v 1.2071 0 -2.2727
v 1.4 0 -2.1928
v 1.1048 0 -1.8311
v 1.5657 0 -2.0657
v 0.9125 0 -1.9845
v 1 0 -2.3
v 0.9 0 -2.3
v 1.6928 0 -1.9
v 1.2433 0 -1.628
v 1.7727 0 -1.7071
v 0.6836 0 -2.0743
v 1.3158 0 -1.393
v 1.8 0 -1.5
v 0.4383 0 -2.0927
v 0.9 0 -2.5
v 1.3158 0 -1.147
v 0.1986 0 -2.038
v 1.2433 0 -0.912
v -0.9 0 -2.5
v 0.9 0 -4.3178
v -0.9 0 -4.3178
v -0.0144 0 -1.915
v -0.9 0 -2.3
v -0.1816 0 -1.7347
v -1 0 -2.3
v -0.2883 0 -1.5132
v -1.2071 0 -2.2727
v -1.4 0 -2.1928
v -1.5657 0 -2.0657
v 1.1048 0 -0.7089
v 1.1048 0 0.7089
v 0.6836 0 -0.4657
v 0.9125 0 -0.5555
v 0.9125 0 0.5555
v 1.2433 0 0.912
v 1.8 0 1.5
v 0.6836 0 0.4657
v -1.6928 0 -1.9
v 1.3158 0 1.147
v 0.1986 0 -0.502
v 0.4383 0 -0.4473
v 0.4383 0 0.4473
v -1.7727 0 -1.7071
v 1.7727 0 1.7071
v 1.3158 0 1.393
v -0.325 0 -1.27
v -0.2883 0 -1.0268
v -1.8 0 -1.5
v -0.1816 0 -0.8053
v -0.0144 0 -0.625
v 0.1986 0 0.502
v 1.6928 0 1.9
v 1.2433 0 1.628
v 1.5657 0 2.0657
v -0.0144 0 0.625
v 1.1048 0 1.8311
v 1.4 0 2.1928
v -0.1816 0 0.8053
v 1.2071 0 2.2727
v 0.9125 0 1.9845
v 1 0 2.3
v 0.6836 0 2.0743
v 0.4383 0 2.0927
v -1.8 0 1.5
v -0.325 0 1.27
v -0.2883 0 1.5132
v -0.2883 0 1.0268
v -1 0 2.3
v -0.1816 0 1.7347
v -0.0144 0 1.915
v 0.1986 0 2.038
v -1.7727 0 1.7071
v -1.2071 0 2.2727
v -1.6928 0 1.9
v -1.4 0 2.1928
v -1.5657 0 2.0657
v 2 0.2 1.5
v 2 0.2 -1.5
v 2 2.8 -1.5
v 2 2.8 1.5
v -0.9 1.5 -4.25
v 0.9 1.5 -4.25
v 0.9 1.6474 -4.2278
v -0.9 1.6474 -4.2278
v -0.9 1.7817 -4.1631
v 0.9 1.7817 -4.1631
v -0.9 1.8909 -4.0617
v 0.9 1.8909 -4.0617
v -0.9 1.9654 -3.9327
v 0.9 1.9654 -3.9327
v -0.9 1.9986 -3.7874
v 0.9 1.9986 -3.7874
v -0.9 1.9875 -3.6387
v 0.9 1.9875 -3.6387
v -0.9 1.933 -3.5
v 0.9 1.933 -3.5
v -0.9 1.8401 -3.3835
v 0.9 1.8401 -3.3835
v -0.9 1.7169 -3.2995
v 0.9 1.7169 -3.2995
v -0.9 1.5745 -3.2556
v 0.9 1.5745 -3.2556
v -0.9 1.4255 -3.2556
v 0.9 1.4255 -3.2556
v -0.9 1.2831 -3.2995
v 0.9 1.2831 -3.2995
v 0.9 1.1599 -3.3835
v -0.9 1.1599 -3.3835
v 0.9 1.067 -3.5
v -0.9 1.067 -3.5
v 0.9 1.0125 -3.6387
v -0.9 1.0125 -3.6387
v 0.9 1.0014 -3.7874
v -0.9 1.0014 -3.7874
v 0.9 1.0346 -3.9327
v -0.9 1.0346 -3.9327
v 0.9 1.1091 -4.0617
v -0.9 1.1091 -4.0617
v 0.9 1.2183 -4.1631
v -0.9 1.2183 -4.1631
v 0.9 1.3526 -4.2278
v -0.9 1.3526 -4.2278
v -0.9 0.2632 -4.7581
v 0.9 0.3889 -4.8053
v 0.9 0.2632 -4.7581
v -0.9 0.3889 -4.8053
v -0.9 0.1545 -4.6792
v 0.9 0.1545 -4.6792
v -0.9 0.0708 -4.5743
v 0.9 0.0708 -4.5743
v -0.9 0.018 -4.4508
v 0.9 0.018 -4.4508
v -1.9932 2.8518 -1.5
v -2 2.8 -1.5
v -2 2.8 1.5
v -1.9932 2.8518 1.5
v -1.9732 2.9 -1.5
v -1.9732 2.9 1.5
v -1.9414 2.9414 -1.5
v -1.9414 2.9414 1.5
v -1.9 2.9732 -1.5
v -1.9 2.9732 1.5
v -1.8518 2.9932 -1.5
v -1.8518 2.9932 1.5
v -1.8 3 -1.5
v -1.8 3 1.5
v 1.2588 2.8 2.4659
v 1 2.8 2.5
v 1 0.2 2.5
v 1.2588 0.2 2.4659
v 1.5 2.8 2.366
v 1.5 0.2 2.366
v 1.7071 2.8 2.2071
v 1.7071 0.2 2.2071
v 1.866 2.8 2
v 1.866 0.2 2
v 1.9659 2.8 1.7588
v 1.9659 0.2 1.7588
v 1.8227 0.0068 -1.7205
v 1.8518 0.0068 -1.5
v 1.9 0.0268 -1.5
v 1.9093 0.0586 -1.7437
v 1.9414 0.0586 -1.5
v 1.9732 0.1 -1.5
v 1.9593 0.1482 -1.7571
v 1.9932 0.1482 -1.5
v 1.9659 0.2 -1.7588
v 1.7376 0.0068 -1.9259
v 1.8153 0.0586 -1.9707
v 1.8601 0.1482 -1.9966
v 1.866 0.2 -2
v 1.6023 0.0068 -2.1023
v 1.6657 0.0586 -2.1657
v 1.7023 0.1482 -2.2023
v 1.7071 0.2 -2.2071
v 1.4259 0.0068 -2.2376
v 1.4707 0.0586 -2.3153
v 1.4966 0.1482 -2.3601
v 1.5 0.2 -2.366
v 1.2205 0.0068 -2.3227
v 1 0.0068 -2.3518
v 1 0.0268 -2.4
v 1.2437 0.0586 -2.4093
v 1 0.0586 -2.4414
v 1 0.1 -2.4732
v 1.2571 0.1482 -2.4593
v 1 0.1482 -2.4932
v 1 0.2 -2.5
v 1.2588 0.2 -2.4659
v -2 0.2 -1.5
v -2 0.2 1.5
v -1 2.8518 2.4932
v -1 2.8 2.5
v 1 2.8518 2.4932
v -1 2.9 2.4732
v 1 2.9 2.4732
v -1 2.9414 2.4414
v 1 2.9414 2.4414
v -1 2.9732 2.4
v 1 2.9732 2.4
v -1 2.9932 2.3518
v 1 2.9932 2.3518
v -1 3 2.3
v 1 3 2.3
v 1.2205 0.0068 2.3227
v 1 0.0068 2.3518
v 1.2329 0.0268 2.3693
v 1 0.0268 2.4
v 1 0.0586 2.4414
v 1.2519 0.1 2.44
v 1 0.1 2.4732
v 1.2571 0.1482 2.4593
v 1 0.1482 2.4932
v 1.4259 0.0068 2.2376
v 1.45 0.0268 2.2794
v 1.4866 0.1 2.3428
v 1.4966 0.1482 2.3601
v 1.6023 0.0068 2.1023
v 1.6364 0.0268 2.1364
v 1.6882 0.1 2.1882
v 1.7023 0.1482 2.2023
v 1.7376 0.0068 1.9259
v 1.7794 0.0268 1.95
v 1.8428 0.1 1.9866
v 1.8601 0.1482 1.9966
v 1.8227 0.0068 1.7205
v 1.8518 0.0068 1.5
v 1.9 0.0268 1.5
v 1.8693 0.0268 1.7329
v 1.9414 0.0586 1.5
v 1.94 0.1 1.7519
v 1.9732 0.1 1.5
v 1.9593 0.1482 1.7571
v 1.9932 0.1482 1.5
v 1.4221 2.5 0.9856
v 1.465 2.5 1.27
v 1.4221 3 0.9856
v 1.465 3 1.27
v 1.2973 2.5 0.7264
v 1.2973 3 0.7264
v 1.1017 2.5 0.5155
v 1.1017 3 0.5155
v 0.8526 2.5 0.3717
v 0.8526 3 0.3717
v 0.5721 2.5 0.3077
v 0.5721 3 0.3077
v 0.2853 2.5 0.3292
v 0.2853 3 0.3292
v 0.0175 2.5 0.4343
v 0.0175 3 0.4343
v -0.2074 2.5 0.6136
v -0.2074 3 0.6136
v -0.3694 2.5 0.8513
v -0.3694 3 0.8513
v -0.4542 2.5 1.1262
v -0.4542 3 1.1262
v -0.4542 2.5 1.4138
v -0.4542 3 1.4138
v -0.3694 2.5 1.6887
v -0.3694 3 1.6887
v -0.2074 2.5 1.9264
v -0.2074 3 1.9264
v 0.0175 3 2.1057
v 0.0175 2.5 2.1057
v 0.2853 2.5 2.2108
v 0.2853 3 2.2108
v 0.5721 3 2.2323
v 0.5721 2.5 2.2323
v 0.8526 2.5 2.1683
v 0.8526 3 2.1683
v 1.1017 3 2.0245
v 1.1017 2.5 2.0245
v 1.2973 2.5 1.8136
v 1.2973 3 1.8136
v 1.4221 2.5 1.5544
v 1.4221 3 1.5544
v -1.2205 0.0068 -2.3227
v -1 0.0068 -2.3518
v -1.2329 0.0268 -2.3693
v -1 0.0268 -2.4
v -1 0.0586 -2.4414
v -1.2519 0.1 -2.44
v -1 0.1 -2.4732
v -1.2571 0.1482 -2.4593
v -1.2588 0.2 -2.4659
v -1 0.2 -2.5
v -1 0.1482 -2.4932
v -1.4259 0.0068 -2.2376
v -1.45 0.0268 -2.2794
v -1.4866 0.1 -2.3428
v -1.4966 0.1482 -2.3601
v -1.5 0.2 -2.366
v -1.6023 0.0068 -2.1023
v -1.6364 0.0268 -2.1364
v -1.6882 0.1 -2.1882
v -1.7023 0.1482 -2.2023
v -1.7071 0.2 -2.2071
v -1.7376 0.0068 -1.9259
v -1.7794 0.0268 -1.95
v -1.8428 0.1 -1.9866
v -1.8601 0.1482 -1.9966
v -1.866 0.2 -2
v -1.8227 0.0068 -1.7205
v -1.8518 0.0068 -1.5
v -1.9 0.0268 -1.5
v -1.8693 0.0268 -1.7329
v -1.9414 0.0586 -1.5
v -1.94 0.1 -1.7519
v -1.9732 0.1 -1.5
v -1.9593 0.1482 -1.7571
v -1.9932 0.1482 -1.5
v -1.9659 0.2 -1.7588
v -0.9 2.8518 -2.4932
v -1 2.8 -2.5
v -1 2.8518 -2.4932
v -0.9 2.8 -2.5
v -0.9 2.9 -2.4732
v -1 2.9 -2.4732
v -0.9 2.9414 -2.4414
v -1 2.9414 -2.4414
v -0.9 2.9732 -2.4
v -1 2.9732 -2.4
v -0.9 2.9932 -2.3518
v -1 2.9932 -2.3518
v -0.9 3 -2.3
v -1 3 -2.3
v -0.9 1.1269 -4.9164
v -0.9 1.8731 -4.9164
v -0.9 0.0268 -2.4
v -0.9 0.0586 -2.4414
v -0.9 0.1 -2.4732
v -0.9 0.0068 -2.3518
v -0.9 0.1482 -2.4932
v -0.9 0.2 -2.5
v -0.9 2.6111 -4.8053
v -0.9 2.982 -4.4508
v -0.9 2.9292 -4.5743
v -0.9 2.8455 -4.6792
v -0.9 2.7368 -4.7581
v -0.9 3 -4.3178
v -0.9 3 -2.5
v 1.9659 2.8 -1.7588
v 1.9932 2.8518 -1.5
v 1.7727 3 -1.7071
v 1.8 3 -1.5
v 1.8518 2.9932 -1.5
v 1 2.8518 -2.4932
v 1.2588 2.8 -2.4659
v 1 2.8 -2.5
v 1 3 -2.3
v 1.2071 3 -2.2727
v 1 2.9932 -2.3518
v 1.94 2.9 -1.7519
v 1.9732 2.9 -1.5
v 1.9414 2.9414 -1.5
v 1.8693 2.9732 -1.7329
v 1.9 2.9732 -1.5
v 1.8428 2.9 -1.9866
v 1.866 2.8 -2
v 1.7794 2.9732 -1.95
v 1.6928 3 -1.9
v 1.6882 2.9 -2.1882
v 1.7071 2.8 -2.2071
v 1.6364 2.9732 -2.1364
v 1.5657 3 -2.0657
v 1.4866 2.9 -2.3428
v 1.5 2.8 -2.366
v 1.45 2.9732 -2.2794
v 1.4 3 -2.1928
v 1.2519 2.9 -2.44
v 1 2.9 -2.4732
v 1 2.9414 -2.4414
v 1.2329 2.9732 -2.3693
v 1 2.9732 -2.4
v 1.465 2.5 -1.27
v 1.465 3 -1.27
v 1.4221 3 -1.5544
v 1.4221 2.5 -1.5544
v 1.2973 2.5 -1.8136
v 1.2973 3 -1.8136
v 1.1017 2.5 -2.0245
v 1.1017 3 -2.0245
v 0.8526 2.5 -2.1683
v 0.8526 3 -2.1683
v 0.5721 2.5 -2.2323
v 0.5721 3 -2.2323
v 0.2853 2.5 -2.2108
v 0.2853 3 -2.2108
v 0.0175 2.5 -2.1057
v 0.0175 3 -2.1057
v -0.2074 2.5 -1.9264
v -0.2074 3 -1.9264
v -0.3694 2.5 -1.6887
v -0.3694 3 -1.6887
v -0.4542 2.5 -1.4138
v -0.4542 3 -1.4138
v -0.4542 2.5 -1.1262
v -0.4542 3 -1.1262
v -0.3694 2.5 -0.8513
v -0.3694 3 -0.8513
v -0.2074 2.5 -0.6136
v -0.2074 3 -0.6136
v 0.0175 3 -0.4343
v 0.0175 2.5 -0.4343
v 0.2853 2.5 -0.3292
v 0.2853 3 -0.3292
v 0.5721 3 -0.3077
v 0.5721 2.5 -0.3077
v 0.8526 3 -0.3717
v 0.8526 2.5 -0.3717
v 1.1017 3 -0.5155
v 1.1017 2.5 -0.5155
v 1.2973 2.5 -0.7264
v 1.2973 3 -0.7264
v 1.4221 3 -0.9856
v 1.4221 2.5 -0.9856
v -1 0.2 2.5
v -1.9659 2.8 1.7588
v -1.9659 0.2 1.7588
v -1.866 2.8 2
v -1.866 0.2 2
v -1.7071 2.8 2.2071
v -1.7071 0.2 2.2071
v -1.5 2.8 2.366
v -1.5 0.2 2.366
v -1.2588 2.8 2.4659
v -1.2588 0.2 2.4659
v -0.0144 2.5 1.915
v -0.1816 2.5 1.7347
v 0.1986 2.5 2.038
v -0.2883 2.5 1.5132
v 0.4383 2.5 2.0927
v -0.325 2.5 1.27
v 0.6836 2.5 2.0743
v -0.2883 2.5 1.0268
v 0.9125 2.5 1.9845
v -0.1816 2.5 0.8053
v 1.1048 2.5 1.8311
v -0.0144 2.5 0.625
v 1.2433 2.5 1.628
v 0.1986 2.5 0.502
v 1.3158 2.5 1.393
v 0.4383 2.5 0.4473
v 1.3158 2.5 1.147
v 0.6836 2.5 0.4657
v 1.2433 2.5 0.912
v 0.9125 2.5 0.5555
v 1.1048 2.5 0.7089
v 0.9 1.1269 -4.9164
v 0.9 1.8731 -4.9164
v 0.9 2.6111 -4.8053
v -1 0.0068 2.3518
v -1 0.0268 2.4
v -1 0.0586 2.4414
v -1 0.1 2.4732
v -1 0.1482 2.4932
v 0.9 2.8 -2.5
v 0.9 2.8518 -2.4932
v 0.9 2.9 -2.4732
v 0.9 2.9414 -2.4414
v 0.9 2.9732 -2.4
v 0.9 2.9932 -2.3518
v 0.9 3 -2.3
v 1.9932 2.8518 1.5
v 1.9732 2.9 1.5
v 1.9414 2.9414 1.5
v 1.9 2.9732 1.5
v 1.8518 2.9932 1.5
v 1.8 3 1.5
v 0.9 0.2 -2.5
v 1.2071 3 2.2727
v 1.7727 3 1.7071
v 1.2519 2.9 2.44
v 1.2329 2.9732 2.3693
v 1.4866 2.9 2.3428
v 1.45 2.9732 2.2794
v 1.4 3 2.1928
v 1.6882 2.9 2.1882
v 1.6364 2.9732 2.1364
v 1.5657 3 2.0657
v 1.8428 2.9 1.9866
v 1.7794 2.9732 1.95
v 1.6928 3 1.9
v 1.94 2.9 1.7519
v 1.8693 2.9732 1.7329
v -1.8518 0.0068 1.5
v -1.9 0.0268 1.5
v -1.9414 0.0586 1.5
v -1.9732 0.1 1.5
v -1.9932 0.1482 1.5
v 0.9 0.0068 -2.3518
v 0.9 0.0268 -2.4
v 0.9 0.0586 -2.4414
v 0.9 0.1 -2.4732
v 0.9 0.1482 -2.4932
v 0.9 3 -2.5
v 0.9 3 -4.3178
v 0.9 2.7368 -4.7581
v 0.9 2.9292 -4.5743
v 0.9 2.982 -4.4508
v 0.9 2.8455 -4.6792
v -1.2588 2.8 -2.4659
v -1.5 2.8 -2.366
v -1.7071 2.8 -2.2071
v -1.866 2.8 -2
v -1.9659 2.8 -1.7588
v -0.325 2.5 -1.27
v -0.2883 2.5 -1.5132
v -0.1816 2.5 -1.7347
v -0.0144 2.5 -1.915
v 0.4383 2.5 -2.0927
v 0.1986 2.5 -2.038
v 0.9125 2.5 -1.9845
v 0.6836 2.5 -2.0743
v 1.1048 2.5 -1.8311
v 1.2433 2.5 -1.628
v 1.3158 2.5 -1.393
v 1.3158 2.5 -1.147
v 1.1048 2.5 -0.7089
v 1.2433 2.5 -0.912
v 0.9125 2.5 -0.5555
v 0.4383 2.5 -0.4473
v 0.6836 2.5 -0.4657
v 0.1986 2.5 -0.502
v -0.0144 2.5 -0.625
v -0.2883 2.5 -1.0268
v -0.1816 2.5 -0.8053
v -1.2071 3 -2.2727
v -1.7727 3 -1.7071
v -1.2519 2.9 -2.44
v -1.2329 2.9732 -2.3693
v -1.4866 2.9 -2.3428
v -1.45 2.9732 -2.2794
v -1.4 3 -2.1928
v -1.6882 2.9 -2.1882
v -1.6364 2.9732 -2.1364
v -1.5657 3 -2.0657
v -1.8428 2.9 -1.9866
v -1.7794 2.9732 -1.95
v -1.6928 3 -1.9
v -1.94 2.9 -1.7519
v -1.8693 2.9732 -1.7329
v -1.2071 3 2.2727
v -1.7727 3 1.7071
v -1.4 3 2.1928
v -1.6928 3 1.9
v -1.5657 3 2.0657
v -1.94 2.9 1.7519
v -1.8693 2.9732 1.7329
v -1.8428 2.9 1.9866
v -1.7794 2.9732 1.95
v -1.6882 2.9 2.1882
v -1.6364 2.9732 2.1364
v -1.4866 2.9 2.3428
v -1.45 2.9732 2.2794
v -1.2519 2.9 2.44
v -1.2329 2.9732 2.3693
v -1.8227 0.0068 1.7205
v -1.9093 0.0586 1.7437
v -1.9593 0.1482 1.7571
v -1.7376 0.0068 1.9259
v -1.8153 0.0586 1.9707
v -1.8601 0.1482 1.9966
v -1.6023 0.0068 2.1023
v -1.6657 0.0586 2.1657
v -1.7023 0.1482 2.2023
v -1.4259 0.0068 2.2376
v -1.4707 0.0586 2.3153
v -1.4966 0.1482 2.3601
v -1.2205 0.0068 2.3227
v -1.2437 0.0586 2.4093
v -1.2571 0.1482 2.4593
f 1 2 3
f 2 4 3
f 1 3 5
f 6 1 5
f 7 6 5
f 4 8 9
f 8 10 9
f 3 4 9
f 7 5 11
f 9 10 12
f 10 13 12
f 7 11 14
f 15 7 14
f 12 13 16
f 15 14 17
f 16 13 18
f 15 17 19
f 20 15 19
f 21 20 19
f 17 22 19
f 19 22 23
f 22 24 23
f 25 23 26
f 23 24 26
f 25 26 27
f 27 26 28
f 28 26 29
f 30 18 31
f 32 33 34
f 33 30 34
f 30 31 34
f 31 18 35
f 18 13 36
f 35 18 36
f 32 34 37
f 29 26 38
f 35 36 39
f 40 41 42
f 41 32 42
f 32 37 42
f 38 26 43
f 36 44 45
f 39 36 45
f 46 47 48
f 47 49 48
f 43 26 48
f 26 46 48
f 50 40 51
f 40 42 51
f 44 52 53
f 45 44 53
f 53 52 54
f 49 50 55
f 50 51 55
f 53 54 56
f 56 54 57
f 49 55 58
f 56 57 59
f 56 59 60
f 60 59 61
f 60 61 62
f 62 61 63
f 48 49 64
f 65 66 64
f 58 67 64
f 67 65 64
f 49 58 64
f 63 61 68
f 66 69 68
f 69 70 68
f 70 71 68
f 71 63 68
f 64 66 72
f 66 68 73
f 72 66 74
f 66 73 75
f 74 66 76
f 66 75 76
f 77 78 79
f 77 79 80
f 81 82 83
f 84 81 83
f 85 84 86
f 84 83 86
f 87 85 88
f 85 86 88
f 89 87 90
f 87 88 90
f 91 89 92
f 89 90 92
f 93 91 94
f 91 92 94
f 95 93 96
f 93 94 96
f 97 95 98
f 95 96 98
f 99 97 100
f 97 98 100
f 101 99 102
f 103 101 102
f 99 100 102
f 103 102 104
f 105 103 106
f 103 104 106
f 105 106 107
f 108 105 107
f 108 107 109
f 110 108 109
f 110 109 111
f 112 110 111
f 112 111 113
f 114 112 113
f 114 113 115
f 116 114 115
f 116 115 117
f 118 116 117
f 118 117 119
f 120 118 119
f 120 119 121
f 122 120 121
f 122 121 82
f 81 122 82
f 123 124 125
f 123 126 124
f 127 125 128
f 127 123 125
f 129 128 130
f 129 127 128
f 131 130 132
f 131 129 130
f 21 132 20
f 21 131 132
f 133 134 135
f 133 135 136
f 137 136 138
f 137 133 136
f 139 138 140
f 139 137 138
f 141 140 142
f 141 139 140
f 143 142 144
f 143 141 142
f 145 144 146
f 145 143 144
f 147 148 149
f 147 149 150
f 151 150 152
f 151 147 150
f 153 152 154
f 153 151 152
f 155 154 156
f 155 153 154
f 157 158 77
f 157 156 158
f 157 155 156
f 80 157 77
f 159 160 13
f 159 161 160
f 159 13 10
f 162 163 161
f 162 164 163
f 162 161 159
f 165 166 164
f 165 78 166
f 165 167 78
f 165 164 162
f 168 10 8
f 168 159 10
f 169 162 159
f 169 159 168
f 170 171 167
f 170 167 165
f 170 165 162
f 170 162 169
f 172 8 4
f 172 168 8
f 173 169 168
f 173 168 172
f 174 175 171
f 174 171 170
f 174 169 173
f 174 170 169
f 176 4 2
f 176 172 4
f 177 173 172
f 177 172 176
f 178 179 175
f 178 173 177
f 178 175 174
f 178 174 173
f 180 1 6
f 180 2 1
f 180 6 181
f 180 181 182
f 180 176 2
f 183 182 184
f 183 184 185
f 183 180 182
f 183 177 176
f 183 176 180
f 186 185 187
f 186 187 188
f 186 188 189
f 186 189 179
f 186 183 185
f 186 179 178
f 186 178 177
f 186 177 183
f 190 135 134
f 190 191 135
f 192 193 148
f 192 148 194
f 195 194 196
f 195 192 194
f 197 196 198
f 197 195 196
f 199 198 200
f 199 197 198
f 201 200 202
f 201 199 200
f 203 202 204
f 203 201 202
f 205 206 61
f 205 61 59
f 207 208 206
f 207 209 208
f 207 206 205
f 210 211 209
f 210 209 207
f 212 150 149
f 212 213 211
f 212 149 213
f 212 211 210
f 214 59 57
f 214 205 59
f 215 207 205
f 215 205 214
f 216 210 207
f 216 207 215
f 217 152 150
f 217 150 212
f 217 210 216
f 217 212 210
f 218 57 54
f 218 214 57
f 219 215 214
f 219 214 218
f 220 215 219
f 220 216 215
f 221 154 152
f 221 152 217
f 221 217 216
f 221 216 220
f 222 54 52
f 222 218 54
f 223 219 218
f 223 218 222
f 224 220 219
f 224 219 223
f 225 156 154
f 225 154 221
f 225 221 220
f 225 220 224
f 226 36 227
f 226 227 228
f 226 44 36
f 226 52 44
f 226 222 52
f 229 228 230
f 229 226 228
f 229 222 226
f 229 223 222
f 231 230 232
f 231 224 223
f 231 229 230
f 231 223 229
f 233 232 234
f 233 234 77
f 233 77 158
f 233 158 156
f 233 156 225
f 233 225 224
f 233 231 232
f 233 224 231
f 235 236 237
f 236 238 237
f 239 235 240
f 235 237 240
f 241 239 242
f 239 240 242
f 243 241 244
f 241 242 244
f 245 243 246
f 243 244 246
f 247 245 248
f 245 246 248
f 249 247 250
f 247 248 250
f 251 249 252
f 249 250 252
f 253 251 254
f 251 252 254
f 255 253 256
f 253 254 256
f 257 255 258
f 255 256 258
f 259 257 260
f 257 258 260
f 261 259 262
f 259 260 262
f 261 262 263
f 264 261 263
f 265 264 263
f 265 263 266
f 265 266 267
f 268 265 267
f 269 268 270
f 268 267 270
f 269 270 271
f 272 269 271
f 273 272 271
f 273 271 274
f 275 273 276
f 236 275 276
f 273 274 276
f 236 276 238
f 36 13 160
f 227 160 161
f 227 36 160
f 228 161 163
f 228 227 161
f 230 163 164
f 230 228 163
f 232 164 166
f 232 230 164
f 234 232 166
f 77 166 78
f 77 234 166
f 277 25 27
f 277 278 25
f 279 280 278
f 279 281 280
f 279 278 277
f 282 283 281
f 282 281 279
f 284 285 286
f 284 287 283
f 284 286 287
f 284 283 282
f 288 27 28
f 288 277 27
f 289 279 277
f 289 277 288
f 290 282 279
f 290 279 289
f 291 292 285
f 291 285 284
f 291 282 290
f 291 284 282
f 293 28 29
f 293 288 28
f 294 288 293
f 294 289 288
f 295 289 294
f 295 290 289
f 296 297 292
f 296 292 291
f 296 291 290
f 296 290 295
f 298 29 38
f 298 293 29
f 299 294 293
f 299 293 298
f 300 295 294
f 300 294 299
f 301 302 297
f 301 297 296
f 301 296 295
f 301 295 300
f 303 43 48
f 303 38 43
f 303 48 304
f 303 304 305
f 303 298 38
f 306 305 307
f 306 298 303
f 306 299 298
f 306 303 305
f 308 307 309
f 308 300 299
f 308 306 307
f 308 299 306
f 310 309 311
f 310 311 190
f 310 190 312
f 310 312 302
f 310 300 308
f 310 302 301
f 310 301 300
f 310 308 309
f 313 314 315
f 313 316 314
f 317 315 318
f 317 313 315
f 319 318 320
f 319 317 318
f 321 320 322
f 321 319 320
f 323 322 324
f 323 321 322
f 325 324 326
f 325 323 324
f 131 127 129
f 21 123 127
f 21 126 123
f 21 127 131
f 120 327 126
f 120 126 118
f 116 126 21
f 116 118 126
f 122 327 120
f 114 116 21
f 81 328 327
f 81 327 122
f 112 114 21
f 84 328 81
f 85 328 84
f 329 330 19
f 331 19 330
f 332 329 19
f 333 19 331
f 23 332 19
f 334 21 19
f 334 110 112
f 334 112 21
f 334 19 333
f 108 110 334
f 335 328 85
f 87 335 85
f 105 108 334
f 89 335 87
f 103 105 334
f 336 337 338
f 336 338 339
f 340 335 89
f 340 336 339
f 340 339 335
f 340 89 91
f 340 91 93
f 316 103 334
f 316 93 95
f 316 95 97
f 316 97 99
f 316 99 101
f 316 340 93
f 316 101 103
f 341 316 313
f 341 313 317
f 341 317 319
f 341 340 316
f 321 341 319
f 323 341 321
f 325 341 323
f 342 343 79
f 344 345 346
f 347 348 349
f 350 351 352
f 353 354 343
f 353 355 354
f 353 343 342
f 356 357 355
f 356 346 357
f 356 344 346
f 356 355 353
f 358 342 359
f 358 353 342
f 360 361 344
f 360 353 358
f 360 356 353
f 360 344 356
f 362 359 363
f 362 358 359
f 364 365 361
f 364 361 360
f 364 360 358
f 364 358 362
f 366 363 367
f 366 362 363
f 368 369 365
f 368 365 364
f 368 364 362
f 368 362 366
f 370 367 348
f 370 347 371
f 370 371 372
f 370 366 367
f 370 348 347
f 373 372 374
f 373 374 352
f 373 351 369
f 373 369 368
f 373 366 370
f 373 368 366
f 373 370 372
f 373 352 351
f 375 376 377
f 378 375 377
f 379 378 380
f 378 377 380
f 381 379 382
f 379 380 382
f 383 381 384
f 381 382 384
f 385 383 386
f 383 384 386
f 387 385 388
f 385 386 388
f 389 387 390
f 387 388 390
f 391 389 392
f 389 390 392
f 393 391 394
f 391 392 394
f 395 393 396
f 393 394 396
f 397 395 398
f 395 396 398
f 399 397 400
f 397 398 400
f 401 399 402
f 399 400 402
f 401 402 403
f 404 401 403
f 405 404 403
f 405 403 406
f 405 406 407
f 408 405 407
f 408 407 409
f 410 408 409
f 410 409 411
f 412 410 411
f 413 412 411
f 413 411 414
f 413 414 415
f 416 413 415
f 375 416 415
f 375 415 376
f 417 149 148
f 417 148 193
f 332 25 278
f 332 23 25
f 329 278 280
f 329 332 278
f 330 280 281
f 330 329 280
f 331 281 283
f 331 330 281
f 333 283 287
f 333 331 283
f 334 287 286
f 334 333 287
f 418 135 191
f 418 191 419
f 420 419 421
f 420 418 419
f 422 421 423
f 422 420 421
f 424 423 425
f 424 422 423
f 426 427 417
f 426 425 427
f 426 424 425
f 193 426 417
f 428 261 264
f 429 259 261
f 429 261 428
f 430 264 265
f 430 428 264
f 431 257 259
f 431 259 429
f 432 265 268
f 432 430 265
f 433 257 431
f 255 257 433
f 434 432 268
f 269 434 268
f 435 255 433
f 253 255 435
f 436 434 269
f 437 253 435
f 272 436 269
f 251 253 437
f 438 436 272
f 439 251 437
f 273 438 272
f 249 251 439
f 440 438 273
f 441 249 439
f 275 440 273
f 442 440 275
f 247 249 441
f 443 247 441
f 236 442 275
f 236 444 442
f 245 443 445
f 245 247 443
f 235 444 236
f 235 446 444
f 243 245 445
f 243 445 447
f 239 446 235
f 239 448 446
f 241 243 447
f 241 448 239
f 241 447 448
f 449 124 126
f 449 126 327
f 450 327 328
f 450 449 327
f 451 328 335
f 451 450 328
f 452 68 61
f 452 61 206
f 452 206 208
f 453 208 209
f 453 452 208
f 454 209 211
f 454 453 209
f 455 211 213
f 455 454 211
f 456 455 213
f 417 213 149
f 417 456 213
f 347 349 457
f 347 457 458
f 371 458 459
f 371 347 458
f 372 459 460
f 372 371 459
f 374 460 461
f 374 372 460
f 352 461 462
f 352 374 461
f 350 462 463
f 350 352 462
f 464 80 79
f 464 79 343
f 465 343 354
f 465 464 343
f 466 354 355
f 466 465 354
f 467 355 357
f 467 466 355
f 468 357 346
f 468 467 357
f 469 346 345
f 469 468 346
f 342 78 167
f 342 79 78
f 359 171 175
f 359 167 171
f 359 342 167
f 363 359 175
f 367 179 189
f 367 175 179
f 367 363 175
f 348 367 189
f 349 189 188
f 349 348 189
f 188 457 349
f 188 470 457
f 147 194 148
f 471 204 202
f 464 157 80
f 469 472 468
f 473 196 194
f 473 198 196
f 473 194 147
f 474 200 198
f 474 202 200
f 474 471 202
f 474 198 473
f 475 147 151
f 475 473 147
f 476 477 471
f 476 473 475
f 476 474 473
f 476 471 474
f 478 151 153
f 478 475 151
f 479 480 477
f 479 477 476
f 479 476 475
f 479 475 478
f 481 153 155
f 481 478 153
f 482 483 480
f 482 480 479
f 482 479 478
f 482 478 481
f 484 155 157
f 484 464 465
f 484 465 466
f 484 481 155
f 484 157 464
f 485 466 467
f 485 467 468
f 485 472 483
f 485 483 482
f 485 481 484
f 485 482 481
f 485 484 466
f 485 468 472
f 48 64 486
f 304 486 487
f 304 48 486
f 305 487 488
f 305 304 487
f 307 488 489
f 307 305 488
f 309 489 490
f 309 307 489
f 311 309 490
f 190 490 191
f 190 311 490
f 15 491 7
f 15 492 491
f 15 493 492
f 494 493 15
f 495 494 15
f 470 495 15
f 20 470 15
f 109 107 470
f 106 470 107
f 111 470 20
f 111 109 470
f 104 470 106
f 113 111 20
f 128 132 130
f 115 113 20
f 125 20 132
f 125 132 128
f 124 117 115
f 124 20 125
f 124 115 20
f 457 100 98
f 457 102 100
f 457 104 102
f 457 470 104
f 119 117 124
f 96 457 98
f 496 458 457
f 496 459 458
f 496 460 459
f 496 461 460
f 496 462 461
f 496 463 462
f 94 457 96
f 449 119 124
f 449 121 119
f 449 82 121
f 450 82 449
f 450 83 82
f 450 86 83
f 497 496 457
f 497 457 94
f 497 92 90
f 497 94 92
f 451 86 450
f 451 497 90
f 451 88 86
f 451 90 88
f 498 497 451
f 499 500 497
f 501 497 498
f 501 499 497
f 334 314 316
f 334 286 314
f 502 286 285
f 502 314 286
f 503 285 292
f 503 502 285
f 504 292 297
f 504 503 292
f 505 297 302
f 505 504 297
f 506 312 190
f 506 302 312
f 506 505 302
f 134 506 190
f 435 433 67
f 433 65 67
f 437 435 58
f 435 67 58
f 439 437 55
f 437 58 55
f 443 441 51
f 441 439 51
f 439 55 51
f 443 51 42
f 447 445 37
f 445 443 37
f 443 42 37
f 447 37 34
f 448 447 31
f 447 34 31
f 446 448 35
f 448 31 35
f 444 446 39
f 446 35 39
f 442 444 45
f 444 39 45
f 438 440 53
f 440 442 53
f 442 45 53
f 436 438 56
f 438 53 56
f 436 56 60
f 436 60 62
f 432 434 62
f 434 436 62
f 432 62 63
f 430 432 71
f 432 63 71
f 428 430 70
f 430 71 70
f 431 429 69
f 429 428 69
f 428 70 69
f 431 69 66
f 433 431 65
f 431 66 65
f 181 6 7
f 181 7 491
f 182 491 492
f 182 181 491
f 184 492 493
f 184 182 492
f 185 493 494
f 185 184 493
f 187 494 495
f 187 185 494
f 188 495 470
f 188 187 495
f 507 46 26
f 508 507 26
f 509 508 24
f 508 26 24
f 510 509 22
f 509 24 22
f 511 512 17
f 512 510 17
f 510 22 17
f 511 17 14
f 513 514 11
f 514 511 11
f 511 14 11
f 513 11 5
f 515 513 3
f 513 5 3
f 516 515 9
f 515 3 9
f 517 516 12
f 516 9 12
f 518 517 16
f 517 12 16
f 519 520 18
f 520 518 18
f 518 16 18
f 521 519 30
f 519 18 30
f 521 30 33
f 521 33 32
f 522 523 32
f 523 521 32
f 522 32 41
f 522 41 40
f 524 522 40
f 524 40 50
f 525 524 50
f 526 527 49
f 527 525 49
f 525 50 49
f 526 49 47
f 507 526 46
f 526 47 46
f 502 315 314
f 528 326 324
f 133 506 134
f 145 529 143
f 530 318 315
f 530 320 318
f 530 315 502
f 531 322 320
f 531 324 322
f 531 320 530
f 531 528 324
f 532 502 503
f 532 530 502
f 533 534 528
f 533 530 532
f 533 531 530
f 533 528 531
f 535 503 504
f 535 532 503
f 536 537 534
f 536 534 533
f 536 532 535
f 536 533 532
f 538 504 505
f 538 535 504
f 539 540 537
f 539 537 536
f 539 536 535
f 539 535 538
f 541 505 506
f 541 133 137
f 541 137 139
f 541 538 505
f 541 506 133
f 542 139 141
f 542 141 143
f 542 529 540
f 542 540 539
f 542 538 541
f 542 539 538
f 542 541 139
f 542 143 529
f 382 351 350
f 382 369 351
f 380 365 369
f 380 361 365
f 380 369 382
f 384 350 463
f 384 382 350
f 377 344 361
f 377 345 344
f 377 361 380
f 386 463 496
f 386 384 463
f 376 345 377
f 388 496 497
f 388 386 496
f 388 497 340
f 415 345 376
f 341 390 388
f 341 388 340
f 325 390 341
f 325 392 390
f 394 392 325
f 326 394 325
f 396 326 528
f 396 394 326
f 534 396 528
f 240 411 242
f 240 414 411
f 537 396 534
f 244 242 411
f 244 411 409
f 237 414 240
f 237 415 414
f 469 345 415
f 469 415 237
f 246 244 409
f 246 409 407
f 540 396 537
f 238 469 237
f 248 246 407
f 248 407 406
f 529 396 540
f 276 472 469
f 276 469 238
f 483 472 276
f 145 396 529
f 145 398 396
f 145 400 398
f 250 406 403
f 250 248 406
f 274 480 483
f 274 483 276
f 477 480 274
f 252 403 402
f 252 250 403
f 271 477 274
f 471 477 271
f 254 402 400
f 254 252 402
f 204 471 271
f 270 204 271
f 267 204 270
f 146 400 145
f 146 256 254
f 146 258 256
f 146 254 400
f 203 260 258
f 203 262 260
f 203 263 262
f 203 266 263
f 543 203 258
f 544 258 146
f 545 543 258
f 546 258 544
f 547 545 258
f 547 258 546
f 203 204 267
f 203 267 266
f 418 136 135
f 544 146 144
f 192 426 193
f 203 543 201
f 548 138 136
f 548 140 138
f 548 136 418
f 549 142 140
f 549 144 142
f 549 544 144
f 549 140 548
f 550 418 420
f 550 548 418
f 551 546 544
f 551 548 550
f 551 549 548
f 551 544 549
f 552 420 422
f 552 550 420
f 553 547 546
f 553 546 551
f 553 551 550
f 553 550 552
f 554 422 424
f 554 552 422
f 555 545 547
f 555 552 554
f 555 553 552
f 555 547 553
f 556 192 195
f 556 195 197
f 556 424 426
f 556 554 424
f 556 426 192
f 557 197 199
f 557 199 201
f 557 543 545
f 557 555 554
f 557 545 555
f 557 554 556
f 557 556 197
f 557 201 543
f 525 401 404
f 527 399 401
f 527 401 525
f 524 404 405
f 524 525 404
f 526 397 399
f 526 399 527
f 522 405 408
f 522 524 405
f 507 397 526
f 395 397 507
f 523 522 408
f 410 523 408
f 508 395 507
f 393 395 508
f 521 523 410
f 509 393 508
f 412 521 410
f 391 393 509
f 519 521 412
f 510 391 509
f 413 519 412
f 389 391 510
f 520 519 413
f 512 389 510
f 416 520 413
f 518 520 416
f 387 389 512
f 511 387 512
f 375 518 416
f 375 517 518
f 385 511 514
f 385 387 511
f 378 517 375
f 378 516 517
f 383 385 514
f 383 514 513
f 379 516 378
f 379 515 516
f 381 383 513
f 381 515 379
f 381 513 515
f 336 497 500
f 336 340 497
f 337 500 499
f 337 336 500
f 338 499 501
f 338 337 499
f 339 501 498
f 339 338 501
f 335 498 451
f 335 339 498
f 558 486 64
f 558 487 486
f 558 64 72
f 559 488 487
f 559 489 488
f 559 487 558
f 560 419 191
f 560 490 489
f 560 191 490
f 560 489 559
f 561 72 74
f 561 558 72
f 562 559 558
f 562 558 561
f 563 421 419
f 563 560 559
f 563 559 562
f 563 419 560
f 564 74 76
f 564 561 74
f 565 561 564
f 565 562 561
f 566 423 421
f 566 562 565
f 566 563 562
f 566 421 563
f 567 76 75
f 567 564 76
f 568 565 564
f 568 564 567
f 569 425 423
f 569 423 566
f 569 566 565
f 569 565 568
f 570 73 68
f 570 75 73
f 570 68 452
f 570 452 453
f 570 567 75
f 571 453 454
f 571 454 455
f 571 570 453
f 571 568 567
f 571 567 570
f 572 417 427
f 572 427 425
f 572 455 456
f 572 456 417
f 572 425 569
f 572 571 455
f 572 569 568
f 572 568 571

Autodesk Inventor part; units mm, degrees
ref_plane "YZ Plane" through (0, 0, 0) normal (1, 0, 0) x (0, 1, 0)
ref_plane "XZ Plane" through (0, 0, 0) normal (0, 1, 0) x (-1, 0, 0)
ref_plane "XY Plane" through (0, 0, 0) normal (0, 0, 1) x (1, 0, 0)
sketch "Sketch1" plane through (0, 0, 0) normal (0, 1, 0) x (-1, 0, 0)
  line L0 (-2, 2.5) -> (2, 2.5)
  line L1 (2, 2.5) -> (2, -2.5)
  line L2 (2, -2.5) -> (-2, -2.5)
  line L3 (-2, -2.5) -> (-2, 2.5)
  line L4 (-2, 2.5) -> (2, -2.5) construction
  line L5 (2, 2.5) -> (-2, -2.5) construction
  line L6 (0, 0) -> (2, 0) construction
  circle A0 centre (-0.5, 1.27) radius 0.825
  line L7 (-0.5, 1.27) -> (-0.5, 0) construction
  circle A1 centre (-0.5, -1.27) radius 0.825
  line L8 (-0.5, -1.27) -> (-0.5, 0) construction
  dimension "d0" = 4
  dimension "d1" = 5
  dimension "d3" = 1.65
  dimension "d4" = 1.27
  dimension "d5" = 1.5
extrude "Extrusion1" add sketch "Sketch1" along normal blind 3
sketch "Sketch2" plane through (0, 3, 0) normal (0, 1, 0) x (1, 0, 0)
  circle A0 centre (0.5, -1.27) radius 0.825 projected
  circle A1 centre (0.5, -1.27) radius 0.965
  circle A2 centre (0.5, 1.27) radius 0.825 projected
  circle A3 centre (0.5, 1.27) radius 0.965
  point P0 (0, 0)
  dimension "d8" = 1.93
  dimension "d9" = 1.93
extrude "Extrusion2" cut sketch "Sketch2" against normal blind 0.5
sketch "Sketch3" plane through (0, 3, 0) normal (0, 1, 0) x (1, 0, 0)
  line L0 (2, 2.5) -> (-2, 2.5) projected
  line L1 (-0.9, 2.5) -> (0.9, 2.5)
  line L2 (0.9, 2.5) -> (0.9, 5)
  line L3 (0.9, 5) -> (-0.9, 5)
  line L4 (-0.9, 5) -> (-0.9, 2.5)
  line L5 (-2, -2.5) -> (2, -2.5) projected
  line L6 (0, -2.5) -> (0, 2.5) construction
  point P0 (0, 0)
  dimension "d12" = 2.5
  dimension "d13" = 1.8
extrude "Extrusion3" add sketch "Sketch3" against normal up to surface (3 mm away)
sketch "Sketch4" plane through (0.9, 3, -2.5) normal (1, 0, 0) x (0, 0, -1)
  line L0 (2.2, 0) -> (2.2, -3) construction
  arc A0 (2.2, -3) -> (2.2, 0) centre (-2.5697, -1.5) ccw
  line L1 (2.5, 0) -> (2.5, -3) projected
  line L2 (2.2, 0) -> (2.5, 0)
  line L3 (2.5, 0) -> (2.5, -3)
  line L4 (2.5, -3) -> (2.2, -3)
  line L5 (2.5, -1.5) -> (1.25, -1.5) construction
  circle A1 centre (1.25, -1.5) radius 0.5
  point P0 (-2.5, -3)
  dimension "d16" = 5
  dimension "d17" = 0.3
  dimension "d18" = 1
  dimension "d19" = 1.25
extrude "Extrusion4" cut sketch "Sketch4" against normal blind 10
fillet "Fillet1" radius 0.5 2 edges at (0, 3, -4.7) (0, 0, -4.7)
fillet "Fillet2" radius 1 4 edges at (2, 1.5, -2.5) (2, 1.5, 2.5) (-2, 1.5, -2.5) (-2, 1.5, 2.5)
fillet "Fillet3" radius 0.2 18 edges at (2, 3, 0) (1.7071, 3, -2.2071) (0.95, 3, -2.5) (1.7071, 3, 2.2071) (0, 3, 2.5) (-1.7071, 3, 2.2071) (-2, 3, 0) (-1.7071, 3, -2.2071) (-0.95, 3, -2.5) (1.7071, 0, -2.2071) (0.95, 0, -2.5) (1.7071, 0, 2.2071) (0, 0, 2.5) (-1.7071, 0, 2.2071) (-2, 0, 0) (-1.7071, 0, -2.2071) (-0.95, 0, -2.5) (2, 0, 0)
equation "\"d9\" = d8"
properties part number "Camera_holder_PCB_1DOF"
